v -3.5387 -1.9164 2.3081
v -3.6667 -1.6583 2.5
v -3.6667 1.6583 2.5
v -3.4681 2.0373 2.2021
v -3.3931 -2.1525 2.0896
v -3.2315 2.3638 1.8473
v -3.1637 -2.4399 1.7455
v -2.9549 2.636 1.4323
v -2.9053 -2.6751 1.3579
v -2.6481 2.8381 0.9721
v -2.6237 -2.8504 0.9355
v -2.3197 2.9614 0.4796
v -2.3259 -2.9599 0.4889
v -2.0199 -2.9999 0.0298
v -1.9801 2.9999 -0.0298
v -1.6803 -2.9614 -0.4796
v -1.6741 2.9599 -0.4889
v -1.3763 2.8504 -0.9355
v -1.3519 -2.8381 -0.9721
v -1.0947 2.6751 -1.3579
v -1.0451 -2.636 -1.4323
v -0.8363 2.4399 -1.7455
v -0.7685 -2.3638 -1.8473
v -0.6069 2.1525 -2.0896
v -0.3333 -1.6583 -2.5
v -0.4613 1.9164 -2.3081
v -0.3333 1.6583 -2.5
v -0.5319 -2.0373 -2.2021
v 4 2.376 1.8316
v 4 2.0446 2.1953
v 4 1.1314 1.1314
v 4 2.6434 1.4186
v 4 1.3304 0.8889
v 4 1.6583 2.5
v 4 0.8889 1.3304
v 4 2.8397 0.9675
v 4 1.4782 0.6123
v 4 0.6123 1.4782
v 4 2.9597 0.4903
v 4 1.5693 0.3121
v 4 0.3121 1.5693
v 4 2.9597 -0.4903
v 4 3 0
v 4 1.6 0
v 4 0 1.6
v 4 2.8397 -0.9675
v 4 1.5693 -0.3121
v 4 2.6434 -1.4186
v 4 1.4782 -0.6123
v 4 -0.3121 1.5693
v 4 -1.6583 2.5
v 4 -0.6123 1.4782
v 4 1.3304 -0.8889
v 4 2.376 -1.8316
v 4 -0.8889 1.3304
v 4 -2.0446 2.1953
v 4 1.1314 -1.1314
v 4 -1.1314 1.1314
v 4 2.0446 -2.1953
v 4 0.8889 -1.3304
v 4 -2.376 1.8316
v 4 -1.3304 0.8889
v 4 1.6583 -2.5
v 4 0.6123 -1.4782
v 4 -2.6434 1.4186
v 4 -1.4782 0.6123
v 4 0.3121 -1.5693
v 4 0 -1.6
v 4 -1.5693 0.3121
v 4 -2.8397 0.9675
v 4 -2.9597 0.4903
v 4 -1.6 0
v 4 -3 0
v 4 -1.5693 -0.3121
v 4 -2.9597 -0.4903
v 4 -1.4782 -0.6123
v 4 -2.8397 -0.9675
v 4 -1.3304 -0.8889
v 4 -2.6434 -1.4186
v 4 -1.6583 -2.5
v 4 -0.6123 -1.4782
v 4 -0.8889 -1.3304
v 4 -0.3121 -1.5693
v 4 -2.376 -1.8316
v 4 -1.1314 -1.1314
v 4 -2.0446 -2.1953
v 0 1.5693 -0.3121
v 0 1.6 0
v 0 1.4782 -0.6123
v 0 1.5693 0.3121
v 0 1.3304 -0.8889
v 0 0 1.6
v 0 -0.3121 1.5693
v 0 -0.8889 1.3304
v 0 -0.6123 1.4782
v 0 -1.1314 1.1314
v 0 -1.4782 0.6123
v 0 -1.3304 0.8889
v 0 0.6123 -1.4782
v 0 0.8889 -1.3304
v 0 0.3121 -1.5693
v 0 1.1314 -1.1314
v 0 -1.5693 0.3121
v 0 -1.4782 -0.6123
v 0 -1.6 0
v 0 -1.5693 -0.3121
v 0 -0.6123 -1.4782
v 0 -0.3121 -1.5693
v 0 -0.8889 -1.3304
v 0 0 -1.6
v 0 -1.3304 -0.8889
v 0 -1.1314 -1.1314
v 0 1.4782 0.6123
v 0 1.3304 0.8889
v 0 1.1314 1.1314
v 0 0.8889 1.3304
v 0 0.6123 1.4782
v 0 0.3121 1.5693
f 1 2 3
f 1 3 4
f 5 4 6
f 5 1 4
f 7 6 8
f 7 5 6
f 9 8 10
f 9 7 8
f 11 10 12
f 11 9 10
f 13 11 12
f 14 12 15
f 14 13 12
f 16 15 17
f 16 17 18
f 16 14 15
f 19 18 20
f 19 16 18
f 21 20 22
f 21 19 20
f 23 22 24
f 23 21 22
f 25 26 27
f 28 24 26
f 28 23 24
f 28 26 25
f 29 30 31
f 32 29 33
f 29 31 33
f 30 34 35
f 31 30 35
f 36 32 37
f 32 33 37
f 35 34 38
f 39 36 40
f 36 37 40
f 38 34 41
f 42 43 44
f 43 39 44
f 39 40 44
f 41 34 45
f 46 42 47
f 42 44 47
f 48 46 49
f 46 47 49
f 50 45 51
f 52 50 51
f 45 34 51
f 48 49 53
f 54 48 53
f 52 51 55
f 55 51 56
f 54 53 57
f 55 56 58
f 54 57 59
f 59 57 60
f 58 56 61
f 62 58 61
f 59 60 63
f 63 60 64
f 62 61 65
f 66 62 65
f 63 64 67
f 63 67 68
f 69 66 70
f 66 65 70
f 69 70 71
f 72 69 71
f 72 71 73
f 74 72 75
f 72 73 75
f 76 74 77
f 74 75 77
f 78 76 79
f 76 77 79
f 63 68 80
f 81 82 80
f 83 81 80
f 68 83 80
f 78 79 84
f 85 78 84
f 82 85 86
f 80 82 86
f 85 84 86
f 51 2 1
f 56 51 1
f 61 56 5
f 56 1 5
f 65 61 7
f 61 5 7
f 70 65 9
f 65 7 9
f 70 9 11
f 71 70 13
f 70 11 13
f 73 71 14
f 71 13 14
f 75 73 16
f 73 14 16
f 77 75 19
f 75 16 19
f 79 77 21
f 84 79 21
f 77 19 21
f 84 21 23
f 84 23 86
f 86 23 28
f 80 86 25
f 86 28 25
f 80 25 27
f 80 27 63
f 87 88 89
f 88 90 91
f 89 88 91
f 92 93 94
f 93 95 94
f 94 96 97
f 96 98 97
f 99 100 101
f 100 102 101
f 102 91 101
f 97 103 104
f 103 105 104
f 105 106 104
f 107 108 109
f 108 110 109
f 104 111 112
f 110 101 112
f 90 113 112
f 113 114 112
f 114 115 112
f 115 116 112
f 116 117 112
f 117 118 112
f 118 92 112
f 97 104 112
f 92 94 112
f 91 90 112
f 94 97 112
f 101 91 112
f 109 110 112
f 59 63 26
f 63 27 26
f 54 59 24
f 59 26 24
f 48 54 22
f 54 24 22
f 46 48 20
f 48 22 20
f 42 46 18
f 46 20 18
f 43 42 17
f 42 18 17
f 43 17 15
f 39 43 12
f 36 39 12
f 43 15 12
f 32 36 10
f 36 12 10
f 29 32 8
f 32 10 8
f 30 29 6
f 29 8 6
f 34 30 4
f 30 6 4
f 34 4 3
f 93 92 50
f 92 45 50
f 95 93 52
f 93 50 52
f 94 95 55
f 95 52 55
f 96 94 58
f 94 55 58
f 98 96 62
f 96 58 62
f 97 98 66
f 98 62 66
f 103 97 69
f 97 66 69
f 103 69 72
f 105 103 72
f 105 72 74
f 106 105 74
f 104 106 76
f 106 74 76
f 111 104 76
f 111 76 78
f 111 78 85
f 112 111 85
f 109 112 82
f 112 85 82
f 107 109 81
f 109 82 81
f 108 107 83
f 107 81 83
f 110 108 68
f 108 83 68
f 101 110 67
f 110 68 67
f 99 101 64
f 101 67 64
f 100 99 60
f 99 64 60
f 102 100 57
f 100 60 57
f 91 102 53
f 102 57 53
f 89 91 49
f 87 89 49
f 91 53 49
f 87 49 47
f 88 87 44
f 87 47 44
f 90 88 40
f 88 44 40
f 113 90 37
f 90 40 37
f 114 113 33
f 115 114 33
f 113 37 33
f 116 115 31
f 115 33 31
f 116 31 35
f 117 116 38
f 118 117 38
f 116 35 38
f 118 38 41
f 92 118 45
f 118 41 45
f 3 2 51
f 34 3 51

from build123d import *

# Parameters (mm, degrees)
CUT_EXTRUDE1_DEPTH      = 6.830951895
CUT_EXTRUDE1_DEPTH_BACK = 6.830951895
CUT_EXTRUDE2_DEPTH      = 6.830951895
CUT_EXTRUDE2_DEPTH_BACK = 6.830951895
SKETCH3_W               = 8
SKETCH3_H               = 0.5
SKETCH3_W_2             = 4.333333333


with BuildPart() as part:
    # Sketch1 → Revolve1 (revolve)
    with BuildSketch(Plane.XY, mode=Mode.PRIVATE) as revolve1_sk:
        Polygon((0, 0), (0, 1.6), (4, 1.6), (4, 3), (-4, 3), (-4, 0), align=None)
    revolve(revolve1_sk.sketch.rotate(Axis((0, 0, 0), (1, 0, 0)), 90), axis=Axis((0, 0, 0), (1, 0, 0)))

    # Sketch2 → Cut-Extrude1 (cut, two sides: drawn at the far end of the back side and taken through both)
    with BuildSketch(Plane(origin=(0, 0, 0), x_dir=(1, 0, 0), z_dir=(0, 1, 0)).offset(-CUT_EXTRUDE1_DEPTH_BACK)):
        Polygon((-4, -3), (0, 3), (-4, 3), align=None)
    extrude(amount=CUT_EXTRUDE1_DEPTH + CUT_EXTRUDE1_DEPTH_BACK, mode=Mode.SUBTRACT)

    # Sketch3 → Cut-Extrude2 (cut, two sides: drawn at the far end of the back side and taken through both)
    with BuildSketch(Plane(origin=(0, 0, 0), x_dir=(1, 0, 0), z_dir=(0, 1, 0)).offset(-CUT_EXTRUDE2_DEPTH_BACK)):
        with Locations((0, -2.75)):
            Rectangle(SKETCH3_W, SKETCH3_H)
        with Locations((1.833333333, 2.75)):
            Rectangle(SKETCH3_W_2, SKETCH3_H)
    extrude(amount=CUT_EXTRUDE2_DEPTH + CUT_EXTRUDE2_DEPTH_BACK, mode=Mode.SUBTRACT)


solid = part.part
